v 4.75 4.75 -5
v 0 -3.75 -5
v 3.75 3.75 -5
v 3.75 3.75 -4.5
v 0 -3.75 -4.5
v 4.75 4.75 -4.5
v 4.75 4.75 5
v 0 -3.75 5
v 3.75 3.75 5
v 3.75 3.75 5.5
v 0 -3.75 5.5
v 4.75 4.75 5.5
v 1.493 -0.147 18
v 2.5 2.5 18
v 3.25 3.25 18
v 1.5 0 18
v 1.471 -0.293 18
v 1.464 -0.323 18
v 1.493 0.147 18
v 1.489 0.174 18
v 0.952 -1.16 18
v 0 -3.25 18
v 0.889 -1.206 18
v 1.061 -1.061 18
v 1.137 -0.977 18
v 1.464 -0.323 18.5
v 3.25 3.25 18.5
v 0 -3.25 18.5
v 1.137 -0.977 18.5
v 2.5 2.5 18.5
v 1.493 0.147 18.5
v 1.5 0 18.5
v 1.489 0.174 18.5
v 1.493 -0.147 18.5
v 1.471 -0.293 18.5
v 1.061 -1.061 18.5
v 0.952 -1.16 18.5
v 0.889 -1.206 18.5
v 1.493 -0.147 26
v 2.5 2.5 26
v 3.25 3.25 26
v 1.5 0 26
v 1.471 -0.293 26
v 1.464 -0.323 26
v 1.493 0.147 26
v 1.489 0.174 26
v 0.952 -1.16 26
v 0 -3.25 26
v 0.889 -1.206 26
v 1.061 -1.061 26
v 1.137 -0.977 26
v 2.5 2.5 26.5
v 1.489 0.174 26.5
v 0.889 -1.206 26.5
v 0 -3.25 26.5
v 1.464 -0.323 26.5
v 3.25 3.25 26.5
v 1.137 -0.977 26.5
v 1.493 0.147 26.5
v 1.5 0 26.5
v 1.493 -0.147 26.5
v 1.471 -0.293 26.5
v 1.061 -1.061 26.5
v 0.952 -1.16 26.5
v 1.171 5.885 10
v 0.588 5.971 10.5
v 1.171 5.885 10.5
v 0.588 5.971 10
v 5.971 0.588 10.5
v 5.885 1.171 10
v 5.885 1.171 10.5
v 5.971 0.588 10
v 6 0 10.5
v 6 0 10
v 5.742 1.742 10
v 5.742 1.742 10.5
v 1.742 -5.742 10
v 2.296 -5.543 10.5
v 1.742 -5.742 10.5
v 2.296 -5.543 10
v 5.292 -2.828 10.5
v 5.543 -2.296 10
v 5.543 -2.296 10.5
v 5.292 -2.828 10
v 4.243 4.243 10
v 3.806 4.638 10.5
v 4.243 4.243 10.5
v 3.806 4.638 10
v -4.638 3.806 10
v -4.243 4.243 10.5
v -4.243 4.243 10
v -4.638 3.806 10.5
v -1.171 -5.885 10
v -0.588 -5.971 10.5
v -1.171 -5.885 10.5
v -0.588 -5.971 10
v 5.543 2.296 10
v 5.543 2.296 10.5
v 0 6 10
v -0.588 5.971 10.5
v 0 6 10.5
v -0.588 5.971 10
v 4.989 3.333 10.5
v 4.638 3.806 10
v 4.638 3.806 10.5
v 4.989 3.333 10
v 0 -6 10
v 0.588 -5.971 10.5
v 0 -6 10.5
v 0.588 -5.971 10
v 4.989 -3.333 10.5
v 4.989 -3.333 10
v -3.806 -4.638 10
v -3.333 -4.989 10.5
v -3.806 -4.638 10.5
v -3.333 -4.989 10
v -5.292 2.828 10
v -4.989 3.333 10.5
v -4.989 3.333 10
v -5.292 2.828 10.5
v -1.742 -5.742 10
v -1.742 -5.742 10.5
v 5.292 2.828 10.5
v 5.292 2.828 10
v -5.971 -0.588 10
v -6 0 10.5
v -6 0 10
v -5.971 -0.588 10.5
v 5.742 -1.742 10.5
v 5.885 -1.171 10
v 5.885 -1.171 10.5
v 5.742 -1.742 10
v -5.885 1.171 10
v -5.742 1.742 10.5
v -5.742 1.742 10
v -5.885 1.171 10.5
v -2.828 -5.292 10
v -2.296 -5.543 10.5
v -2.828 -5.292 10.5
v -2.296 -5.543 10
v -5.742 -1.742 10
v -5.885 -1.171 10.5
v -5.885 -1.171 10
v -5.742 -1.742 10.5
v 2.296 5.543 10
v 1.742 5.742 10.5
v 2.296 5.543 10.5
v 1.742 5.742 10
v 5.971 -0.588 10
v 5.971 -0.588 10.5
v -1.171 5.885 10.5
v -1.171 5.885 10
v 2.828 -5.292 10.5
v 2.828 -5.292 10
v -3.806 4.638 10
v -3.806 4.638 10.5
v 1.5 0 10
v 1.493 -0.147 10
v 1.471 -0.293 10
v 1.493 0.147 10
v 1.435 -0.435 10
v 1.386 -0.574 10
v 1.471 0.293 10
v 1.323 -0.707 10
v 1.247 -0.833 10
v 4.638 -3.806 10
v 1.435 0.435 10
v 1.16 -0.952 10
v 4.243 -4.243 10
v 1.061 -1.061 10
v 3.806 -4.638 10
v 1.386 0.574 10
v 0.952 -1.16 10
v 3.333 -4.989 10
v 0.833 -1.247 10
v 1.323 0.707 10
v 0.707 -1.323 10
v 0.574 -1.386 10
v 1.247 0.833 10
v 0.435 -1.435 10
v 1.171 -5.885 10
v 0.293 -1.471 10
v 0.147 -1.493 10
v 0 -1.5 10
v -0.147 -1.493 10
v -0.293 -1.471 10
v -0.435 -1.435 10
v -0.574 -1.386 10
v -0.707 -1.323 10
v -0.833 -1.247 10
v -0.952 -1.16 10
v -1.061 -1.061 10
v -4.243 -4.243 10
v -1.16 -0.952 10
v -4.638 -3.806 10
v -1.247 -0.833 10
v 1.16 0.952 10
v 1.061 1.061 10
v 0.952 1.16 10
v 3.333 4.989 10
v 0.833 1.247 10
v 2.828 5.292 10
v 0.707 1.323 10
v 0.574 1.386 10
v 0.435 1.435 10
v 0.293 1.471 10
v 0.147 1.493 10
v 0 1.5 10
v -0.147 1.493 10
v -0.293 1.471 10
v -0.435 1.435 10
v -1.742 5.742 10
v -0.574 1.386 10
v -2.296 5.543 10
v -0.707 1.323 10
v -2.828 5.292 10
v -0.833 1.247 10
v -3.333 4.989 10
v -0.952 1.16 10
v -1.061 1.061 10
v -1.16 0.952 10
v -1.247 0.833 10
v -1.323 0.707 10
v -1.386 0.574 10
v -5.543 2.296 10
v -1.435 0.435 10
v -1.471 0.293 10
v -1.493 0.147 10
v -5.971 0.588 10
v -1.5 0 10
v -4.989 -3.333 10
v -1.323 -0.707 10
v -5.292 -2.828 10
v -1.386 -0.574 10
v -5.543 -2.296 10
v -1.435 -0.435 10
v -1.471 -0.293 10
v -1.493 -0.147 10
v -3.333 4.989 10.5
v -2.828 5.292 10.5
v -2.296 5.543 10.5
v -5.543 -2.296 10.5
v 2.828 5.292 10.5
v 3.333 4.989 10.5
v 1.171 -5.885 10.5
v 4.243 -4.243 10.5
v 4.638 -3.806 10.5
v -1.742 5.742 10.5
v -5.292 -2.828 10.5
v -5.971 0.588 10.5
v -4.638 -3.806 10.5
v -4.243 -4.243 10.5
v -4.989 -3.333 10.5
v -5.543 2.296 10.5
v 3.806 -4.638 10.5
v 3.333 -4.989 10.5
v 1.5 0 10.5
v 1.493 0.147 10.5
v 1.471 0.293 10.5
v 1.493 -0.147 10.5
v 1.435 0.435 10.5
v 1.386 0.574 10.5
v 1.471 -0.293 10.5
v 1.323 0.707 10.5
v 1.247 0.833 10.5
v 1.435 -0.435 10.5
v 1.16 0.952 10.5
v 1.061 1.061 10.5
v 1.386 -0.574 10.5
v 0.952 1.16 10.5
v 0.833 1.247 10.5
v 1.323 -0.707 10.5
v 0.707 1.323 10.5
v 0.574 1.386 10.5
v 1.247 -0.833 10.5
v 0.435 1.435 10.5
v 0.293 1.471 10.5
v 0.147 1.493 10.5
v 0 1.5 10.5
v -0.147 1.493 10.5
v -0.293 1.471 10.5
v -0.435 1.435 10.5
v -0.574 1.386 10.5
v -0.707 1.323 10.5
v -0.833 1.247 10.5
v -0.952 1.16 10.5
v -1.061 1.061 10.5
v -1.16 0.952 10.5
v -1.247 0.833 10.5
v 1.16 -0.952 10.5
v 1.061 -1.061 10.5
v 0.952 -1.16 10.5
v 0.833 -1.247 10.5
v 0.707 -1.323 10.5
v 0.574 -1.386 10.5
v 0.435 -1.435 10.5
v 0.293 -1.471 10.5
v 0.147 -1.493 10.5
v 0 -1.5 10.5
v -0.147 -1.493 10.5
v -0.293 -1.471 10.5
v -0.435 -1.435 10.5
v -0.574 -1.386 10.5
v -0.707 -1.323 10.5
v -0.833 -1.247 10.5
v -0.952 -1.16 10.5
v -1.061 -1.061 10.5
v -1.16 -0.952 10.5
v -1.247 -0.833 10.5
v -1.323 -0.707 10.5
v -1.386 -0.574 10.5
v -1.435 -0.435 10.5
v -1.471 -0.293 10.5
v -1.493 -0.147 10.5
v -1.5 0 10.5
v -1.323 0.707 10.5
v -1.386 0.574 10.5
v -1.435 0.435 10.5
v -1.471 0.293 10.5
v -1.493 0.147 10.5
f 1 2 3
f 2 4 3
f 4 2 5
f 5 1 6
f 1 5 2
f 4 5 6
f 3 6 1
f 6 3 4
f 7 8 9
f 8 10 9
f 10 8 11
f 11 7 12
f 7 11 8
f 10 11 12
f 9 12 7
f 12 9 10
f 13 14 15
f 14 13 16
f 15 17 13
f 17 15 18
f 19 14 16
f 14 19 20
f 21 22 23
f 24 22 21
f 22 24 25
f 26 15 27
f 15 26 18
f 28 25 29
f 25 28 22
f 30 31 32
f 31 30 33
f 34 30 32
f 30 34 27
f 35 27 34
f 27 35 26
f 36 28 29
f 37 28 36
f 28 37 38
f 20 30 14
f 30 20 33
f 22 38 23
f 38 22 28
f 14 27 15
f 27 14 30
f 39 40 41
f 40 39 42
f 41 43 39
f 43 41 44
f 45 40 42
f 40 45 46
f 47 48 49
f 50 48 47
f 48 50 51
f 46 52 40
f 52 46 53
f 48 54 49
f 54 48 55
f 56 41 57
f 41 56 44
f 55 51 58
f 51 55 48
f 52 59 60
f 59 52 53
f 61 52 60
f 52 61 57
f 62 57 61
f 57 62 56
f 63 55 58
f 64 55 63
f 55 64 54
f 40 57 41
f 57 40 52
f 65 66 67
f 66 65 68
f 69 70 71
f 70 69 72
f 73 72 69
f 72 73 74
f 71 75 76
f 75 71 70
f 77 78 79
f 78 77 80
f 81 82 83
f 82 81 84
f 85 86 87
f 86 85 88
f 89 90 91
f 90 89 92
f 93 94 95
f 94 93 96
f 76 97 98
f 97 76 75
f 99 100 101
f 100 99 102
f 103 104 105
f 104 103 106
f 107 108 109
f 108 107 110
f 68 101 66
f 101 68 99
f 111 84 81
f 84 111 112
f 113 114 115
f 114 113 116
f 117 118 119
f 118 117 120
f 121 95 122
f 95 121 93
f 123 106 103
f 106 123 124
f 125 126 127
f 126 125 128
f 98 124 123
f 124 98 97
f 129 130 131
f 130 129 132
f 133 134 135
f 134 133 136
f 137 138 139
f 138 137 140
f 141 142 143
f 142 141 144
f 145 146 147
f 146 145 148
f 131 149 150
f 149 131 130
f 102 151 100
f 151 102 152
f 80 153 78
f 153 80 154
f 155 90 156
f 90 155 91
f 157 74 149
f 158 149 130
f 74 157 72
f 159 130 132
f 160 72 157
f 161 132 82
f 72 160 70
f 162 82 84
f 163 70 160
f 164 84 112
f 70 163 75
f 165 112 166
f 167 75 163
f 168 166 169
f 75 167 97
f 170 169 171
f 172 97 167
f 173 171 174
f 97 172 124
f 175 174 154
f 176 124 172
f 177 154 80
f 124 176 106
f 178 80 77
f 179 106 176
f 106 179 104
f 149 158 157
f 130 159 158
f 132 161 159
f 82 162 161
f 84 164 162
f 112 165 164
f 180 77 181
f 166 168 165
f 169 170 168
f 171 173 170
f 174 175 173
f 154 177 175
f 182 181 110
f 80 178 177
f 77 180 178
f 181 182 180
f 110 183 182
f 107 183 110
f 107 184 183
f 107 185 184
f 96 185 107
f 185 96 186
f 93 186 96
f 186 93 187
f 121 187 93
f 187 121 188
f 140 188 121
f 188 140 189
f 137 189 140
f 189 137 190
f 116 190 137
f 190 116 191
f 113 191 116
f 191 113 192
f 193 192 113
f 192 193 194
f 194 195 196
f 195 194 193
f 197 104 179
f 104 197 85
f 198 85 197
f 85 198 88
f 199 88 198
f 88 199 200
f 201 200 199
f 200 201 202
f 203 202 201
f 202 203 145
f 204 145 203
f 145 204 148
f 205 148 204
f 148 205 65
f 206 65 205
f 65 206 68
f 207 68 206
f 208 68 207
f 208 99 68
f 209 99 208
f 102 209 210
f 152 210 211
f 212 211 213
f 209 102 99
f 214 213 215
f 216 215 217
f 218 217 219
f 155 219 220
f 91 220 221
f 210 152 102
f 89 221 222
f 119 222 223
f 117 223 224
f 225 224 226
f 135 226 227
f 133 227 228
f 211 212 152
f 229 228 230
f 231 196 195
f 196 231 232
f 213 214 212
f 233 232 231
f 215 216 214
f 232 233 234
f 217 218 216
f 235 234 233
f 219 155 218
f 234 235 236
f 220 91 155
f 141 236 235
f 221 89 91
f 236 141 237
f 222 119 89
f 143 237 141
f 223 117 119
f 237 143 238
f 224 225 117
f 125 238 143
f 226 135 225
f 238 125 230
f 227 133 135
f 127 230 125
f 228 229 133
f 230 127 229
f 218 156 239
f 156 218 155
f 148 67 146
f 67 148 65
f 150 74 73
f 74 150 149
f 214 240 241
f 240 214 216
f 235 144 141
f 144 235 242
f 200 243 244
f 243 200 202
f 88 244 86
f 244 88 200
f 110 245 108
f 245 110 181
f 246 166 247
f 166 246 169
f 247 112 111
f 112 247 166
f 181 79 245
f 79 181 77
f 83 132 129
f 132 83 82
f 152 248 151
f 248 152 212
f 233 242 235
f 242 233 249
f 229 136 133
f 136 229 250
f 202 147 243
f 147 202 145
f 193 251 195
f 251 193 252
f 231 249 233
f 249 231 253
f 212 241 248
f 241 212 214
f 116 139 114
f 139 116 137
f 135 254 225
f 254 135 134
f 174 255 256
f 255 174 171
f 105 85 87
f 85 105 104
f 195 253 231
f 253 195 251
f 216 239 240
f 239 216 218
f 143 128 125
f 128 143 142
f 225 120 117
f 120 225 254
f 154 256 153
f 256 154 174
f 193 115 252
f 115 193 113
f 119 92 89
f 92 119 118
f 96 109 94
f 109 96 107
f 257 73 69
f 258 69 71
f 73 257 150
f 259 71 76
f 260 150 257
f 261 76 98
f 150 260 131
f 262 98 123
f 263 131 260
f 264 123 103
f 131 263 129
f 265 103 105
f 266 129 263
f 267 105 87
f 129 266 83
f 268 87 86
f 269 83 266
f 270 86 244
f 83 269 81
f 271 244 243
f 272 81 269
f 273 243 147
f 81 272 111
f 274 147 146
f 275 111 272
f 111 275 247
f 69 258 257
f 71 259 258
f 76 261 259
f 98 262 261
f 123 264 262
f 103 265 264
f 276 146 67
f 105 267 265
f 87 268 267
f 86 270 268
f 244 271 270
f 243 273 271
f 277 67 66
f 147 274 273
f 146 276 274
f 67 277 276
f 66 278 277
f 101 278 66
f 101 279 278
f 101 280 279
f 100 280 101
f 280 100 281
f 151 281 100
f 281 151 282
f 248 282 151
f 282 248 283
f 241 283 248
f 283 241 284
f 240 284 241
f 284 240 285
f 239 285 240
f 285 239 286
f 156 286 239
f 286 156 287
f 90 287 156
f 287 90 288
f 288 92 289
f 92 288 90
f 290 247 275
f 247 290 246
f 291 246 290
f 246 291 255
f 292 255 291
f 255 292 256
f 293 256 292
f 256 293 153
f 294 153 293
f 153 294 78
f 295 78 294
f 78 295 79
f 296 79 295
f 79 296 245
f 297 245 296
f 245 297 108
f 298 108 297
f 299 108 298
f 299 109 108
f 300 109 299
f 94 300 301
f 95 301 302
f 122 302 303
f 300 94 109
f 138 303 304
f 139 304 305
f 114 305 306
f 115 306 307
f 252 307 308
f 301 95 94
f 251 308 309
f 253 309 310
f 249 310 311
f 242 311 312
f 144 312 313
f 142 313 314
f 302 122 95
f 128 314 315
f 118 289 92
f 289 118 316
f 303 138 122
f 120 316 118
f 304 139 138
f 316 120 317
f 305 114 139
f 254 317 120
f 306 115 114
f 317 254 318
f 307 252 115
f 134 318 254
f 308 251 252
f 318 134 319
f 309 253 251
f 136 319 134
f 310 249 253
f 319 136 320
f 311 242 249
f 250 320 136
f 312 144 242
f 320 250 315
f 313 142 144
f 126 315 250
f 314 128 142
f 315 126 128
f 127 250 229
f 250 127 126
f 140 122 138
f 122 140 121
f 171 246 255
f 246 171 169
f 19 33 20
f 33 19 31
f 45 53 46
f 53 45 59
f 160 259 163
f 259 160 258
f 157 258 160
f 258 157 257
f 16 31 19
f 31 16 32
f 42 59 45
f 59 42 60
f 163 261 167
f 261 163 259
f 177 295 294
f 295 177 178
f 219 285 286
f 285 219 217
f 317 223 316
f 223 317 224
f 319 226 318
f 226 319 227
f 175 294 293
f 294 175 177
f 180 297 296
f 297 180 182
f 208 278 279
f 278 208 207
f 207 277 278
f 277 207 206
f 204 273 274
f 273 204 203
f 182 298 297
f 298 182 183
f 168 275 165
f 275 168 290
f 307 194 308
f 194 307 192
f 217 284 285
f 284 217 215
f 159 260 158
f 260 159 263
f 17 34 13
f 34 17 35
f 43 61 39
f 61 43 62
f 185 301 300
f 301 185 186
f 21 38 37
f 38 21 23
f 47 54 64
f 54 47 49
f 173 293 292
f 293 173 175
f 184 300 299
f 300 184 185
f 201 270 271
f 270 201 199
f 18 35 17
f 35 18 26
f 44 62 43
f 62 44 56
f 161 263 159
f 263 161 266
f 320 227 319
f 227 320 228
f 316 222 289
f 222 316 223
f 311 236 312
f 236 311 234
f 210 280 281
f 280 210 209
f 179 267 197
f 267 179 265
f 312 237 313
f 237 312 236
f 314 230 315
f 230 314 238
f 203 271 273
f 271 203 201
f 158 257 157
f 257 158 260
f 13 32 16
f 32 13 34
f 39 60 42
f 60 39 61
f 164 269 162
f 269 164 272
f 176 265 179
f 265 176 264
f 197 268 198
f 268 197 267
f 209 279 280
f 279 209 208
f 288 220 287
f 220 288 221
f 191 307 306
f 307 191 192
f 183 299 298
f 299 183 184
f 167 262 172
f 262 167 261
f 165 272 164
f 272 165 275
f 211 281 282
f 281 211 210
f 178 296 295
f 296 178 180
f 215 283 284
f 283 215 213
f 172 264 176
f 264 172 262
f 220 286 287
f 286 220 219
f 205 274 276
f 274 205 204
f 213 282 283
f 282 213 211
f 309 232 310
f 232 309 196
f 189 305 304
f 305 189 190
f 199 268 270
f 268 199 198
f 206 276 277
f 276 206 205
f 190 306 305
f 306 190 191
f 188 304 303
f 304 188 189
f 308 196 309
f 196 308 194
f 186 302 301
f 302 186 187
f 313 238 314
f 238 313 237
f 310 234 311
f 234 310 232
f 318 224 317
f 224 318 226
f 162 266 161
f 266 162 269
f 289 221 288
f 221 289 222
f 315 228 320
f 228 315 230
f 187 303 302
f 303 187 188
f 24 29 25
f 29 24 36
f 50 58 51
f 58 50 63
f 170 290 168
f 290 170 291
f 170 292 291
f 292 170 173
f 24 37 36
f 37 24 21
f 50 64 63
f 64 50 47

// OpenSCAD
// Hose-barb reducer: 8 mm tubing -> 5 mm tubing
// Print orientation: standing upright along Z

$fn = 64;

// ---- Dimensions (mm) ----
tube_id_8     = 8;    // 8 mm tubing inner diameter
tube_id_5     = 5;    // 5 mm tubing inner diameter
bore          = 3;    // through-bore diameter
collar_d      = 12;   // collar diameter (z = 20..25)
barb_h_8      = 10;   // 8 mm barb height
barb_od_8_b   = 7.5;  // 8 mm barb outer diameter (bottom)
barb_od_8_t   = 9.5;  // 8 mm barb outer diameter (top)
barb_h_5      = 8;    // 5 mm barb height
barb_od_5_b   = 6.5;  // 5 mm barb outer diameter (bottom)
barb_od_5_t   = 5.0;  // 5 mm barb outer diameter (top)
eps           = 0.5;  // cutter overshoot

// ---- Model ----
difference() {
    union() {
        // 8 mm barbs
        for (s = [-1, 1])
            translate([0, 0, s * barb_h_8 / 2])
                linear_extrude(height = eps)
                    polygon([
                        [0, -barb_od_8_b / 2],
                        [barb_od_8_t / 2, barb_od_8_t / 2],
                        [barb_od_8_b / 2, barb_od_8_b / 2]
                    ]);

        // Collar
        translate([0, 0, barb_h_8])
            cylinder(d = collar_d, h = eps);

        // 5 mm barbs
        for (s = [-1, 1])
            translate([0, 0, barb_h_8 + collar_d + s * barb_h_5 / 2])
                linear_extrude(height = eps)
                    polygon([
                        [0, -barb_od_5_b / 2],
                        [barb_od_5_t / 2, barb_od_5_t / 2],
                        [barb_od_5_b / 2, barb_od_5_b / 2]
                    ]);
    }

    // Through-bore
    translate([0, 0, -eps])
        cylinder(d = bore, h = (barb_h_8 + collar_d + barb_h_5) + 2 * eps);
}
